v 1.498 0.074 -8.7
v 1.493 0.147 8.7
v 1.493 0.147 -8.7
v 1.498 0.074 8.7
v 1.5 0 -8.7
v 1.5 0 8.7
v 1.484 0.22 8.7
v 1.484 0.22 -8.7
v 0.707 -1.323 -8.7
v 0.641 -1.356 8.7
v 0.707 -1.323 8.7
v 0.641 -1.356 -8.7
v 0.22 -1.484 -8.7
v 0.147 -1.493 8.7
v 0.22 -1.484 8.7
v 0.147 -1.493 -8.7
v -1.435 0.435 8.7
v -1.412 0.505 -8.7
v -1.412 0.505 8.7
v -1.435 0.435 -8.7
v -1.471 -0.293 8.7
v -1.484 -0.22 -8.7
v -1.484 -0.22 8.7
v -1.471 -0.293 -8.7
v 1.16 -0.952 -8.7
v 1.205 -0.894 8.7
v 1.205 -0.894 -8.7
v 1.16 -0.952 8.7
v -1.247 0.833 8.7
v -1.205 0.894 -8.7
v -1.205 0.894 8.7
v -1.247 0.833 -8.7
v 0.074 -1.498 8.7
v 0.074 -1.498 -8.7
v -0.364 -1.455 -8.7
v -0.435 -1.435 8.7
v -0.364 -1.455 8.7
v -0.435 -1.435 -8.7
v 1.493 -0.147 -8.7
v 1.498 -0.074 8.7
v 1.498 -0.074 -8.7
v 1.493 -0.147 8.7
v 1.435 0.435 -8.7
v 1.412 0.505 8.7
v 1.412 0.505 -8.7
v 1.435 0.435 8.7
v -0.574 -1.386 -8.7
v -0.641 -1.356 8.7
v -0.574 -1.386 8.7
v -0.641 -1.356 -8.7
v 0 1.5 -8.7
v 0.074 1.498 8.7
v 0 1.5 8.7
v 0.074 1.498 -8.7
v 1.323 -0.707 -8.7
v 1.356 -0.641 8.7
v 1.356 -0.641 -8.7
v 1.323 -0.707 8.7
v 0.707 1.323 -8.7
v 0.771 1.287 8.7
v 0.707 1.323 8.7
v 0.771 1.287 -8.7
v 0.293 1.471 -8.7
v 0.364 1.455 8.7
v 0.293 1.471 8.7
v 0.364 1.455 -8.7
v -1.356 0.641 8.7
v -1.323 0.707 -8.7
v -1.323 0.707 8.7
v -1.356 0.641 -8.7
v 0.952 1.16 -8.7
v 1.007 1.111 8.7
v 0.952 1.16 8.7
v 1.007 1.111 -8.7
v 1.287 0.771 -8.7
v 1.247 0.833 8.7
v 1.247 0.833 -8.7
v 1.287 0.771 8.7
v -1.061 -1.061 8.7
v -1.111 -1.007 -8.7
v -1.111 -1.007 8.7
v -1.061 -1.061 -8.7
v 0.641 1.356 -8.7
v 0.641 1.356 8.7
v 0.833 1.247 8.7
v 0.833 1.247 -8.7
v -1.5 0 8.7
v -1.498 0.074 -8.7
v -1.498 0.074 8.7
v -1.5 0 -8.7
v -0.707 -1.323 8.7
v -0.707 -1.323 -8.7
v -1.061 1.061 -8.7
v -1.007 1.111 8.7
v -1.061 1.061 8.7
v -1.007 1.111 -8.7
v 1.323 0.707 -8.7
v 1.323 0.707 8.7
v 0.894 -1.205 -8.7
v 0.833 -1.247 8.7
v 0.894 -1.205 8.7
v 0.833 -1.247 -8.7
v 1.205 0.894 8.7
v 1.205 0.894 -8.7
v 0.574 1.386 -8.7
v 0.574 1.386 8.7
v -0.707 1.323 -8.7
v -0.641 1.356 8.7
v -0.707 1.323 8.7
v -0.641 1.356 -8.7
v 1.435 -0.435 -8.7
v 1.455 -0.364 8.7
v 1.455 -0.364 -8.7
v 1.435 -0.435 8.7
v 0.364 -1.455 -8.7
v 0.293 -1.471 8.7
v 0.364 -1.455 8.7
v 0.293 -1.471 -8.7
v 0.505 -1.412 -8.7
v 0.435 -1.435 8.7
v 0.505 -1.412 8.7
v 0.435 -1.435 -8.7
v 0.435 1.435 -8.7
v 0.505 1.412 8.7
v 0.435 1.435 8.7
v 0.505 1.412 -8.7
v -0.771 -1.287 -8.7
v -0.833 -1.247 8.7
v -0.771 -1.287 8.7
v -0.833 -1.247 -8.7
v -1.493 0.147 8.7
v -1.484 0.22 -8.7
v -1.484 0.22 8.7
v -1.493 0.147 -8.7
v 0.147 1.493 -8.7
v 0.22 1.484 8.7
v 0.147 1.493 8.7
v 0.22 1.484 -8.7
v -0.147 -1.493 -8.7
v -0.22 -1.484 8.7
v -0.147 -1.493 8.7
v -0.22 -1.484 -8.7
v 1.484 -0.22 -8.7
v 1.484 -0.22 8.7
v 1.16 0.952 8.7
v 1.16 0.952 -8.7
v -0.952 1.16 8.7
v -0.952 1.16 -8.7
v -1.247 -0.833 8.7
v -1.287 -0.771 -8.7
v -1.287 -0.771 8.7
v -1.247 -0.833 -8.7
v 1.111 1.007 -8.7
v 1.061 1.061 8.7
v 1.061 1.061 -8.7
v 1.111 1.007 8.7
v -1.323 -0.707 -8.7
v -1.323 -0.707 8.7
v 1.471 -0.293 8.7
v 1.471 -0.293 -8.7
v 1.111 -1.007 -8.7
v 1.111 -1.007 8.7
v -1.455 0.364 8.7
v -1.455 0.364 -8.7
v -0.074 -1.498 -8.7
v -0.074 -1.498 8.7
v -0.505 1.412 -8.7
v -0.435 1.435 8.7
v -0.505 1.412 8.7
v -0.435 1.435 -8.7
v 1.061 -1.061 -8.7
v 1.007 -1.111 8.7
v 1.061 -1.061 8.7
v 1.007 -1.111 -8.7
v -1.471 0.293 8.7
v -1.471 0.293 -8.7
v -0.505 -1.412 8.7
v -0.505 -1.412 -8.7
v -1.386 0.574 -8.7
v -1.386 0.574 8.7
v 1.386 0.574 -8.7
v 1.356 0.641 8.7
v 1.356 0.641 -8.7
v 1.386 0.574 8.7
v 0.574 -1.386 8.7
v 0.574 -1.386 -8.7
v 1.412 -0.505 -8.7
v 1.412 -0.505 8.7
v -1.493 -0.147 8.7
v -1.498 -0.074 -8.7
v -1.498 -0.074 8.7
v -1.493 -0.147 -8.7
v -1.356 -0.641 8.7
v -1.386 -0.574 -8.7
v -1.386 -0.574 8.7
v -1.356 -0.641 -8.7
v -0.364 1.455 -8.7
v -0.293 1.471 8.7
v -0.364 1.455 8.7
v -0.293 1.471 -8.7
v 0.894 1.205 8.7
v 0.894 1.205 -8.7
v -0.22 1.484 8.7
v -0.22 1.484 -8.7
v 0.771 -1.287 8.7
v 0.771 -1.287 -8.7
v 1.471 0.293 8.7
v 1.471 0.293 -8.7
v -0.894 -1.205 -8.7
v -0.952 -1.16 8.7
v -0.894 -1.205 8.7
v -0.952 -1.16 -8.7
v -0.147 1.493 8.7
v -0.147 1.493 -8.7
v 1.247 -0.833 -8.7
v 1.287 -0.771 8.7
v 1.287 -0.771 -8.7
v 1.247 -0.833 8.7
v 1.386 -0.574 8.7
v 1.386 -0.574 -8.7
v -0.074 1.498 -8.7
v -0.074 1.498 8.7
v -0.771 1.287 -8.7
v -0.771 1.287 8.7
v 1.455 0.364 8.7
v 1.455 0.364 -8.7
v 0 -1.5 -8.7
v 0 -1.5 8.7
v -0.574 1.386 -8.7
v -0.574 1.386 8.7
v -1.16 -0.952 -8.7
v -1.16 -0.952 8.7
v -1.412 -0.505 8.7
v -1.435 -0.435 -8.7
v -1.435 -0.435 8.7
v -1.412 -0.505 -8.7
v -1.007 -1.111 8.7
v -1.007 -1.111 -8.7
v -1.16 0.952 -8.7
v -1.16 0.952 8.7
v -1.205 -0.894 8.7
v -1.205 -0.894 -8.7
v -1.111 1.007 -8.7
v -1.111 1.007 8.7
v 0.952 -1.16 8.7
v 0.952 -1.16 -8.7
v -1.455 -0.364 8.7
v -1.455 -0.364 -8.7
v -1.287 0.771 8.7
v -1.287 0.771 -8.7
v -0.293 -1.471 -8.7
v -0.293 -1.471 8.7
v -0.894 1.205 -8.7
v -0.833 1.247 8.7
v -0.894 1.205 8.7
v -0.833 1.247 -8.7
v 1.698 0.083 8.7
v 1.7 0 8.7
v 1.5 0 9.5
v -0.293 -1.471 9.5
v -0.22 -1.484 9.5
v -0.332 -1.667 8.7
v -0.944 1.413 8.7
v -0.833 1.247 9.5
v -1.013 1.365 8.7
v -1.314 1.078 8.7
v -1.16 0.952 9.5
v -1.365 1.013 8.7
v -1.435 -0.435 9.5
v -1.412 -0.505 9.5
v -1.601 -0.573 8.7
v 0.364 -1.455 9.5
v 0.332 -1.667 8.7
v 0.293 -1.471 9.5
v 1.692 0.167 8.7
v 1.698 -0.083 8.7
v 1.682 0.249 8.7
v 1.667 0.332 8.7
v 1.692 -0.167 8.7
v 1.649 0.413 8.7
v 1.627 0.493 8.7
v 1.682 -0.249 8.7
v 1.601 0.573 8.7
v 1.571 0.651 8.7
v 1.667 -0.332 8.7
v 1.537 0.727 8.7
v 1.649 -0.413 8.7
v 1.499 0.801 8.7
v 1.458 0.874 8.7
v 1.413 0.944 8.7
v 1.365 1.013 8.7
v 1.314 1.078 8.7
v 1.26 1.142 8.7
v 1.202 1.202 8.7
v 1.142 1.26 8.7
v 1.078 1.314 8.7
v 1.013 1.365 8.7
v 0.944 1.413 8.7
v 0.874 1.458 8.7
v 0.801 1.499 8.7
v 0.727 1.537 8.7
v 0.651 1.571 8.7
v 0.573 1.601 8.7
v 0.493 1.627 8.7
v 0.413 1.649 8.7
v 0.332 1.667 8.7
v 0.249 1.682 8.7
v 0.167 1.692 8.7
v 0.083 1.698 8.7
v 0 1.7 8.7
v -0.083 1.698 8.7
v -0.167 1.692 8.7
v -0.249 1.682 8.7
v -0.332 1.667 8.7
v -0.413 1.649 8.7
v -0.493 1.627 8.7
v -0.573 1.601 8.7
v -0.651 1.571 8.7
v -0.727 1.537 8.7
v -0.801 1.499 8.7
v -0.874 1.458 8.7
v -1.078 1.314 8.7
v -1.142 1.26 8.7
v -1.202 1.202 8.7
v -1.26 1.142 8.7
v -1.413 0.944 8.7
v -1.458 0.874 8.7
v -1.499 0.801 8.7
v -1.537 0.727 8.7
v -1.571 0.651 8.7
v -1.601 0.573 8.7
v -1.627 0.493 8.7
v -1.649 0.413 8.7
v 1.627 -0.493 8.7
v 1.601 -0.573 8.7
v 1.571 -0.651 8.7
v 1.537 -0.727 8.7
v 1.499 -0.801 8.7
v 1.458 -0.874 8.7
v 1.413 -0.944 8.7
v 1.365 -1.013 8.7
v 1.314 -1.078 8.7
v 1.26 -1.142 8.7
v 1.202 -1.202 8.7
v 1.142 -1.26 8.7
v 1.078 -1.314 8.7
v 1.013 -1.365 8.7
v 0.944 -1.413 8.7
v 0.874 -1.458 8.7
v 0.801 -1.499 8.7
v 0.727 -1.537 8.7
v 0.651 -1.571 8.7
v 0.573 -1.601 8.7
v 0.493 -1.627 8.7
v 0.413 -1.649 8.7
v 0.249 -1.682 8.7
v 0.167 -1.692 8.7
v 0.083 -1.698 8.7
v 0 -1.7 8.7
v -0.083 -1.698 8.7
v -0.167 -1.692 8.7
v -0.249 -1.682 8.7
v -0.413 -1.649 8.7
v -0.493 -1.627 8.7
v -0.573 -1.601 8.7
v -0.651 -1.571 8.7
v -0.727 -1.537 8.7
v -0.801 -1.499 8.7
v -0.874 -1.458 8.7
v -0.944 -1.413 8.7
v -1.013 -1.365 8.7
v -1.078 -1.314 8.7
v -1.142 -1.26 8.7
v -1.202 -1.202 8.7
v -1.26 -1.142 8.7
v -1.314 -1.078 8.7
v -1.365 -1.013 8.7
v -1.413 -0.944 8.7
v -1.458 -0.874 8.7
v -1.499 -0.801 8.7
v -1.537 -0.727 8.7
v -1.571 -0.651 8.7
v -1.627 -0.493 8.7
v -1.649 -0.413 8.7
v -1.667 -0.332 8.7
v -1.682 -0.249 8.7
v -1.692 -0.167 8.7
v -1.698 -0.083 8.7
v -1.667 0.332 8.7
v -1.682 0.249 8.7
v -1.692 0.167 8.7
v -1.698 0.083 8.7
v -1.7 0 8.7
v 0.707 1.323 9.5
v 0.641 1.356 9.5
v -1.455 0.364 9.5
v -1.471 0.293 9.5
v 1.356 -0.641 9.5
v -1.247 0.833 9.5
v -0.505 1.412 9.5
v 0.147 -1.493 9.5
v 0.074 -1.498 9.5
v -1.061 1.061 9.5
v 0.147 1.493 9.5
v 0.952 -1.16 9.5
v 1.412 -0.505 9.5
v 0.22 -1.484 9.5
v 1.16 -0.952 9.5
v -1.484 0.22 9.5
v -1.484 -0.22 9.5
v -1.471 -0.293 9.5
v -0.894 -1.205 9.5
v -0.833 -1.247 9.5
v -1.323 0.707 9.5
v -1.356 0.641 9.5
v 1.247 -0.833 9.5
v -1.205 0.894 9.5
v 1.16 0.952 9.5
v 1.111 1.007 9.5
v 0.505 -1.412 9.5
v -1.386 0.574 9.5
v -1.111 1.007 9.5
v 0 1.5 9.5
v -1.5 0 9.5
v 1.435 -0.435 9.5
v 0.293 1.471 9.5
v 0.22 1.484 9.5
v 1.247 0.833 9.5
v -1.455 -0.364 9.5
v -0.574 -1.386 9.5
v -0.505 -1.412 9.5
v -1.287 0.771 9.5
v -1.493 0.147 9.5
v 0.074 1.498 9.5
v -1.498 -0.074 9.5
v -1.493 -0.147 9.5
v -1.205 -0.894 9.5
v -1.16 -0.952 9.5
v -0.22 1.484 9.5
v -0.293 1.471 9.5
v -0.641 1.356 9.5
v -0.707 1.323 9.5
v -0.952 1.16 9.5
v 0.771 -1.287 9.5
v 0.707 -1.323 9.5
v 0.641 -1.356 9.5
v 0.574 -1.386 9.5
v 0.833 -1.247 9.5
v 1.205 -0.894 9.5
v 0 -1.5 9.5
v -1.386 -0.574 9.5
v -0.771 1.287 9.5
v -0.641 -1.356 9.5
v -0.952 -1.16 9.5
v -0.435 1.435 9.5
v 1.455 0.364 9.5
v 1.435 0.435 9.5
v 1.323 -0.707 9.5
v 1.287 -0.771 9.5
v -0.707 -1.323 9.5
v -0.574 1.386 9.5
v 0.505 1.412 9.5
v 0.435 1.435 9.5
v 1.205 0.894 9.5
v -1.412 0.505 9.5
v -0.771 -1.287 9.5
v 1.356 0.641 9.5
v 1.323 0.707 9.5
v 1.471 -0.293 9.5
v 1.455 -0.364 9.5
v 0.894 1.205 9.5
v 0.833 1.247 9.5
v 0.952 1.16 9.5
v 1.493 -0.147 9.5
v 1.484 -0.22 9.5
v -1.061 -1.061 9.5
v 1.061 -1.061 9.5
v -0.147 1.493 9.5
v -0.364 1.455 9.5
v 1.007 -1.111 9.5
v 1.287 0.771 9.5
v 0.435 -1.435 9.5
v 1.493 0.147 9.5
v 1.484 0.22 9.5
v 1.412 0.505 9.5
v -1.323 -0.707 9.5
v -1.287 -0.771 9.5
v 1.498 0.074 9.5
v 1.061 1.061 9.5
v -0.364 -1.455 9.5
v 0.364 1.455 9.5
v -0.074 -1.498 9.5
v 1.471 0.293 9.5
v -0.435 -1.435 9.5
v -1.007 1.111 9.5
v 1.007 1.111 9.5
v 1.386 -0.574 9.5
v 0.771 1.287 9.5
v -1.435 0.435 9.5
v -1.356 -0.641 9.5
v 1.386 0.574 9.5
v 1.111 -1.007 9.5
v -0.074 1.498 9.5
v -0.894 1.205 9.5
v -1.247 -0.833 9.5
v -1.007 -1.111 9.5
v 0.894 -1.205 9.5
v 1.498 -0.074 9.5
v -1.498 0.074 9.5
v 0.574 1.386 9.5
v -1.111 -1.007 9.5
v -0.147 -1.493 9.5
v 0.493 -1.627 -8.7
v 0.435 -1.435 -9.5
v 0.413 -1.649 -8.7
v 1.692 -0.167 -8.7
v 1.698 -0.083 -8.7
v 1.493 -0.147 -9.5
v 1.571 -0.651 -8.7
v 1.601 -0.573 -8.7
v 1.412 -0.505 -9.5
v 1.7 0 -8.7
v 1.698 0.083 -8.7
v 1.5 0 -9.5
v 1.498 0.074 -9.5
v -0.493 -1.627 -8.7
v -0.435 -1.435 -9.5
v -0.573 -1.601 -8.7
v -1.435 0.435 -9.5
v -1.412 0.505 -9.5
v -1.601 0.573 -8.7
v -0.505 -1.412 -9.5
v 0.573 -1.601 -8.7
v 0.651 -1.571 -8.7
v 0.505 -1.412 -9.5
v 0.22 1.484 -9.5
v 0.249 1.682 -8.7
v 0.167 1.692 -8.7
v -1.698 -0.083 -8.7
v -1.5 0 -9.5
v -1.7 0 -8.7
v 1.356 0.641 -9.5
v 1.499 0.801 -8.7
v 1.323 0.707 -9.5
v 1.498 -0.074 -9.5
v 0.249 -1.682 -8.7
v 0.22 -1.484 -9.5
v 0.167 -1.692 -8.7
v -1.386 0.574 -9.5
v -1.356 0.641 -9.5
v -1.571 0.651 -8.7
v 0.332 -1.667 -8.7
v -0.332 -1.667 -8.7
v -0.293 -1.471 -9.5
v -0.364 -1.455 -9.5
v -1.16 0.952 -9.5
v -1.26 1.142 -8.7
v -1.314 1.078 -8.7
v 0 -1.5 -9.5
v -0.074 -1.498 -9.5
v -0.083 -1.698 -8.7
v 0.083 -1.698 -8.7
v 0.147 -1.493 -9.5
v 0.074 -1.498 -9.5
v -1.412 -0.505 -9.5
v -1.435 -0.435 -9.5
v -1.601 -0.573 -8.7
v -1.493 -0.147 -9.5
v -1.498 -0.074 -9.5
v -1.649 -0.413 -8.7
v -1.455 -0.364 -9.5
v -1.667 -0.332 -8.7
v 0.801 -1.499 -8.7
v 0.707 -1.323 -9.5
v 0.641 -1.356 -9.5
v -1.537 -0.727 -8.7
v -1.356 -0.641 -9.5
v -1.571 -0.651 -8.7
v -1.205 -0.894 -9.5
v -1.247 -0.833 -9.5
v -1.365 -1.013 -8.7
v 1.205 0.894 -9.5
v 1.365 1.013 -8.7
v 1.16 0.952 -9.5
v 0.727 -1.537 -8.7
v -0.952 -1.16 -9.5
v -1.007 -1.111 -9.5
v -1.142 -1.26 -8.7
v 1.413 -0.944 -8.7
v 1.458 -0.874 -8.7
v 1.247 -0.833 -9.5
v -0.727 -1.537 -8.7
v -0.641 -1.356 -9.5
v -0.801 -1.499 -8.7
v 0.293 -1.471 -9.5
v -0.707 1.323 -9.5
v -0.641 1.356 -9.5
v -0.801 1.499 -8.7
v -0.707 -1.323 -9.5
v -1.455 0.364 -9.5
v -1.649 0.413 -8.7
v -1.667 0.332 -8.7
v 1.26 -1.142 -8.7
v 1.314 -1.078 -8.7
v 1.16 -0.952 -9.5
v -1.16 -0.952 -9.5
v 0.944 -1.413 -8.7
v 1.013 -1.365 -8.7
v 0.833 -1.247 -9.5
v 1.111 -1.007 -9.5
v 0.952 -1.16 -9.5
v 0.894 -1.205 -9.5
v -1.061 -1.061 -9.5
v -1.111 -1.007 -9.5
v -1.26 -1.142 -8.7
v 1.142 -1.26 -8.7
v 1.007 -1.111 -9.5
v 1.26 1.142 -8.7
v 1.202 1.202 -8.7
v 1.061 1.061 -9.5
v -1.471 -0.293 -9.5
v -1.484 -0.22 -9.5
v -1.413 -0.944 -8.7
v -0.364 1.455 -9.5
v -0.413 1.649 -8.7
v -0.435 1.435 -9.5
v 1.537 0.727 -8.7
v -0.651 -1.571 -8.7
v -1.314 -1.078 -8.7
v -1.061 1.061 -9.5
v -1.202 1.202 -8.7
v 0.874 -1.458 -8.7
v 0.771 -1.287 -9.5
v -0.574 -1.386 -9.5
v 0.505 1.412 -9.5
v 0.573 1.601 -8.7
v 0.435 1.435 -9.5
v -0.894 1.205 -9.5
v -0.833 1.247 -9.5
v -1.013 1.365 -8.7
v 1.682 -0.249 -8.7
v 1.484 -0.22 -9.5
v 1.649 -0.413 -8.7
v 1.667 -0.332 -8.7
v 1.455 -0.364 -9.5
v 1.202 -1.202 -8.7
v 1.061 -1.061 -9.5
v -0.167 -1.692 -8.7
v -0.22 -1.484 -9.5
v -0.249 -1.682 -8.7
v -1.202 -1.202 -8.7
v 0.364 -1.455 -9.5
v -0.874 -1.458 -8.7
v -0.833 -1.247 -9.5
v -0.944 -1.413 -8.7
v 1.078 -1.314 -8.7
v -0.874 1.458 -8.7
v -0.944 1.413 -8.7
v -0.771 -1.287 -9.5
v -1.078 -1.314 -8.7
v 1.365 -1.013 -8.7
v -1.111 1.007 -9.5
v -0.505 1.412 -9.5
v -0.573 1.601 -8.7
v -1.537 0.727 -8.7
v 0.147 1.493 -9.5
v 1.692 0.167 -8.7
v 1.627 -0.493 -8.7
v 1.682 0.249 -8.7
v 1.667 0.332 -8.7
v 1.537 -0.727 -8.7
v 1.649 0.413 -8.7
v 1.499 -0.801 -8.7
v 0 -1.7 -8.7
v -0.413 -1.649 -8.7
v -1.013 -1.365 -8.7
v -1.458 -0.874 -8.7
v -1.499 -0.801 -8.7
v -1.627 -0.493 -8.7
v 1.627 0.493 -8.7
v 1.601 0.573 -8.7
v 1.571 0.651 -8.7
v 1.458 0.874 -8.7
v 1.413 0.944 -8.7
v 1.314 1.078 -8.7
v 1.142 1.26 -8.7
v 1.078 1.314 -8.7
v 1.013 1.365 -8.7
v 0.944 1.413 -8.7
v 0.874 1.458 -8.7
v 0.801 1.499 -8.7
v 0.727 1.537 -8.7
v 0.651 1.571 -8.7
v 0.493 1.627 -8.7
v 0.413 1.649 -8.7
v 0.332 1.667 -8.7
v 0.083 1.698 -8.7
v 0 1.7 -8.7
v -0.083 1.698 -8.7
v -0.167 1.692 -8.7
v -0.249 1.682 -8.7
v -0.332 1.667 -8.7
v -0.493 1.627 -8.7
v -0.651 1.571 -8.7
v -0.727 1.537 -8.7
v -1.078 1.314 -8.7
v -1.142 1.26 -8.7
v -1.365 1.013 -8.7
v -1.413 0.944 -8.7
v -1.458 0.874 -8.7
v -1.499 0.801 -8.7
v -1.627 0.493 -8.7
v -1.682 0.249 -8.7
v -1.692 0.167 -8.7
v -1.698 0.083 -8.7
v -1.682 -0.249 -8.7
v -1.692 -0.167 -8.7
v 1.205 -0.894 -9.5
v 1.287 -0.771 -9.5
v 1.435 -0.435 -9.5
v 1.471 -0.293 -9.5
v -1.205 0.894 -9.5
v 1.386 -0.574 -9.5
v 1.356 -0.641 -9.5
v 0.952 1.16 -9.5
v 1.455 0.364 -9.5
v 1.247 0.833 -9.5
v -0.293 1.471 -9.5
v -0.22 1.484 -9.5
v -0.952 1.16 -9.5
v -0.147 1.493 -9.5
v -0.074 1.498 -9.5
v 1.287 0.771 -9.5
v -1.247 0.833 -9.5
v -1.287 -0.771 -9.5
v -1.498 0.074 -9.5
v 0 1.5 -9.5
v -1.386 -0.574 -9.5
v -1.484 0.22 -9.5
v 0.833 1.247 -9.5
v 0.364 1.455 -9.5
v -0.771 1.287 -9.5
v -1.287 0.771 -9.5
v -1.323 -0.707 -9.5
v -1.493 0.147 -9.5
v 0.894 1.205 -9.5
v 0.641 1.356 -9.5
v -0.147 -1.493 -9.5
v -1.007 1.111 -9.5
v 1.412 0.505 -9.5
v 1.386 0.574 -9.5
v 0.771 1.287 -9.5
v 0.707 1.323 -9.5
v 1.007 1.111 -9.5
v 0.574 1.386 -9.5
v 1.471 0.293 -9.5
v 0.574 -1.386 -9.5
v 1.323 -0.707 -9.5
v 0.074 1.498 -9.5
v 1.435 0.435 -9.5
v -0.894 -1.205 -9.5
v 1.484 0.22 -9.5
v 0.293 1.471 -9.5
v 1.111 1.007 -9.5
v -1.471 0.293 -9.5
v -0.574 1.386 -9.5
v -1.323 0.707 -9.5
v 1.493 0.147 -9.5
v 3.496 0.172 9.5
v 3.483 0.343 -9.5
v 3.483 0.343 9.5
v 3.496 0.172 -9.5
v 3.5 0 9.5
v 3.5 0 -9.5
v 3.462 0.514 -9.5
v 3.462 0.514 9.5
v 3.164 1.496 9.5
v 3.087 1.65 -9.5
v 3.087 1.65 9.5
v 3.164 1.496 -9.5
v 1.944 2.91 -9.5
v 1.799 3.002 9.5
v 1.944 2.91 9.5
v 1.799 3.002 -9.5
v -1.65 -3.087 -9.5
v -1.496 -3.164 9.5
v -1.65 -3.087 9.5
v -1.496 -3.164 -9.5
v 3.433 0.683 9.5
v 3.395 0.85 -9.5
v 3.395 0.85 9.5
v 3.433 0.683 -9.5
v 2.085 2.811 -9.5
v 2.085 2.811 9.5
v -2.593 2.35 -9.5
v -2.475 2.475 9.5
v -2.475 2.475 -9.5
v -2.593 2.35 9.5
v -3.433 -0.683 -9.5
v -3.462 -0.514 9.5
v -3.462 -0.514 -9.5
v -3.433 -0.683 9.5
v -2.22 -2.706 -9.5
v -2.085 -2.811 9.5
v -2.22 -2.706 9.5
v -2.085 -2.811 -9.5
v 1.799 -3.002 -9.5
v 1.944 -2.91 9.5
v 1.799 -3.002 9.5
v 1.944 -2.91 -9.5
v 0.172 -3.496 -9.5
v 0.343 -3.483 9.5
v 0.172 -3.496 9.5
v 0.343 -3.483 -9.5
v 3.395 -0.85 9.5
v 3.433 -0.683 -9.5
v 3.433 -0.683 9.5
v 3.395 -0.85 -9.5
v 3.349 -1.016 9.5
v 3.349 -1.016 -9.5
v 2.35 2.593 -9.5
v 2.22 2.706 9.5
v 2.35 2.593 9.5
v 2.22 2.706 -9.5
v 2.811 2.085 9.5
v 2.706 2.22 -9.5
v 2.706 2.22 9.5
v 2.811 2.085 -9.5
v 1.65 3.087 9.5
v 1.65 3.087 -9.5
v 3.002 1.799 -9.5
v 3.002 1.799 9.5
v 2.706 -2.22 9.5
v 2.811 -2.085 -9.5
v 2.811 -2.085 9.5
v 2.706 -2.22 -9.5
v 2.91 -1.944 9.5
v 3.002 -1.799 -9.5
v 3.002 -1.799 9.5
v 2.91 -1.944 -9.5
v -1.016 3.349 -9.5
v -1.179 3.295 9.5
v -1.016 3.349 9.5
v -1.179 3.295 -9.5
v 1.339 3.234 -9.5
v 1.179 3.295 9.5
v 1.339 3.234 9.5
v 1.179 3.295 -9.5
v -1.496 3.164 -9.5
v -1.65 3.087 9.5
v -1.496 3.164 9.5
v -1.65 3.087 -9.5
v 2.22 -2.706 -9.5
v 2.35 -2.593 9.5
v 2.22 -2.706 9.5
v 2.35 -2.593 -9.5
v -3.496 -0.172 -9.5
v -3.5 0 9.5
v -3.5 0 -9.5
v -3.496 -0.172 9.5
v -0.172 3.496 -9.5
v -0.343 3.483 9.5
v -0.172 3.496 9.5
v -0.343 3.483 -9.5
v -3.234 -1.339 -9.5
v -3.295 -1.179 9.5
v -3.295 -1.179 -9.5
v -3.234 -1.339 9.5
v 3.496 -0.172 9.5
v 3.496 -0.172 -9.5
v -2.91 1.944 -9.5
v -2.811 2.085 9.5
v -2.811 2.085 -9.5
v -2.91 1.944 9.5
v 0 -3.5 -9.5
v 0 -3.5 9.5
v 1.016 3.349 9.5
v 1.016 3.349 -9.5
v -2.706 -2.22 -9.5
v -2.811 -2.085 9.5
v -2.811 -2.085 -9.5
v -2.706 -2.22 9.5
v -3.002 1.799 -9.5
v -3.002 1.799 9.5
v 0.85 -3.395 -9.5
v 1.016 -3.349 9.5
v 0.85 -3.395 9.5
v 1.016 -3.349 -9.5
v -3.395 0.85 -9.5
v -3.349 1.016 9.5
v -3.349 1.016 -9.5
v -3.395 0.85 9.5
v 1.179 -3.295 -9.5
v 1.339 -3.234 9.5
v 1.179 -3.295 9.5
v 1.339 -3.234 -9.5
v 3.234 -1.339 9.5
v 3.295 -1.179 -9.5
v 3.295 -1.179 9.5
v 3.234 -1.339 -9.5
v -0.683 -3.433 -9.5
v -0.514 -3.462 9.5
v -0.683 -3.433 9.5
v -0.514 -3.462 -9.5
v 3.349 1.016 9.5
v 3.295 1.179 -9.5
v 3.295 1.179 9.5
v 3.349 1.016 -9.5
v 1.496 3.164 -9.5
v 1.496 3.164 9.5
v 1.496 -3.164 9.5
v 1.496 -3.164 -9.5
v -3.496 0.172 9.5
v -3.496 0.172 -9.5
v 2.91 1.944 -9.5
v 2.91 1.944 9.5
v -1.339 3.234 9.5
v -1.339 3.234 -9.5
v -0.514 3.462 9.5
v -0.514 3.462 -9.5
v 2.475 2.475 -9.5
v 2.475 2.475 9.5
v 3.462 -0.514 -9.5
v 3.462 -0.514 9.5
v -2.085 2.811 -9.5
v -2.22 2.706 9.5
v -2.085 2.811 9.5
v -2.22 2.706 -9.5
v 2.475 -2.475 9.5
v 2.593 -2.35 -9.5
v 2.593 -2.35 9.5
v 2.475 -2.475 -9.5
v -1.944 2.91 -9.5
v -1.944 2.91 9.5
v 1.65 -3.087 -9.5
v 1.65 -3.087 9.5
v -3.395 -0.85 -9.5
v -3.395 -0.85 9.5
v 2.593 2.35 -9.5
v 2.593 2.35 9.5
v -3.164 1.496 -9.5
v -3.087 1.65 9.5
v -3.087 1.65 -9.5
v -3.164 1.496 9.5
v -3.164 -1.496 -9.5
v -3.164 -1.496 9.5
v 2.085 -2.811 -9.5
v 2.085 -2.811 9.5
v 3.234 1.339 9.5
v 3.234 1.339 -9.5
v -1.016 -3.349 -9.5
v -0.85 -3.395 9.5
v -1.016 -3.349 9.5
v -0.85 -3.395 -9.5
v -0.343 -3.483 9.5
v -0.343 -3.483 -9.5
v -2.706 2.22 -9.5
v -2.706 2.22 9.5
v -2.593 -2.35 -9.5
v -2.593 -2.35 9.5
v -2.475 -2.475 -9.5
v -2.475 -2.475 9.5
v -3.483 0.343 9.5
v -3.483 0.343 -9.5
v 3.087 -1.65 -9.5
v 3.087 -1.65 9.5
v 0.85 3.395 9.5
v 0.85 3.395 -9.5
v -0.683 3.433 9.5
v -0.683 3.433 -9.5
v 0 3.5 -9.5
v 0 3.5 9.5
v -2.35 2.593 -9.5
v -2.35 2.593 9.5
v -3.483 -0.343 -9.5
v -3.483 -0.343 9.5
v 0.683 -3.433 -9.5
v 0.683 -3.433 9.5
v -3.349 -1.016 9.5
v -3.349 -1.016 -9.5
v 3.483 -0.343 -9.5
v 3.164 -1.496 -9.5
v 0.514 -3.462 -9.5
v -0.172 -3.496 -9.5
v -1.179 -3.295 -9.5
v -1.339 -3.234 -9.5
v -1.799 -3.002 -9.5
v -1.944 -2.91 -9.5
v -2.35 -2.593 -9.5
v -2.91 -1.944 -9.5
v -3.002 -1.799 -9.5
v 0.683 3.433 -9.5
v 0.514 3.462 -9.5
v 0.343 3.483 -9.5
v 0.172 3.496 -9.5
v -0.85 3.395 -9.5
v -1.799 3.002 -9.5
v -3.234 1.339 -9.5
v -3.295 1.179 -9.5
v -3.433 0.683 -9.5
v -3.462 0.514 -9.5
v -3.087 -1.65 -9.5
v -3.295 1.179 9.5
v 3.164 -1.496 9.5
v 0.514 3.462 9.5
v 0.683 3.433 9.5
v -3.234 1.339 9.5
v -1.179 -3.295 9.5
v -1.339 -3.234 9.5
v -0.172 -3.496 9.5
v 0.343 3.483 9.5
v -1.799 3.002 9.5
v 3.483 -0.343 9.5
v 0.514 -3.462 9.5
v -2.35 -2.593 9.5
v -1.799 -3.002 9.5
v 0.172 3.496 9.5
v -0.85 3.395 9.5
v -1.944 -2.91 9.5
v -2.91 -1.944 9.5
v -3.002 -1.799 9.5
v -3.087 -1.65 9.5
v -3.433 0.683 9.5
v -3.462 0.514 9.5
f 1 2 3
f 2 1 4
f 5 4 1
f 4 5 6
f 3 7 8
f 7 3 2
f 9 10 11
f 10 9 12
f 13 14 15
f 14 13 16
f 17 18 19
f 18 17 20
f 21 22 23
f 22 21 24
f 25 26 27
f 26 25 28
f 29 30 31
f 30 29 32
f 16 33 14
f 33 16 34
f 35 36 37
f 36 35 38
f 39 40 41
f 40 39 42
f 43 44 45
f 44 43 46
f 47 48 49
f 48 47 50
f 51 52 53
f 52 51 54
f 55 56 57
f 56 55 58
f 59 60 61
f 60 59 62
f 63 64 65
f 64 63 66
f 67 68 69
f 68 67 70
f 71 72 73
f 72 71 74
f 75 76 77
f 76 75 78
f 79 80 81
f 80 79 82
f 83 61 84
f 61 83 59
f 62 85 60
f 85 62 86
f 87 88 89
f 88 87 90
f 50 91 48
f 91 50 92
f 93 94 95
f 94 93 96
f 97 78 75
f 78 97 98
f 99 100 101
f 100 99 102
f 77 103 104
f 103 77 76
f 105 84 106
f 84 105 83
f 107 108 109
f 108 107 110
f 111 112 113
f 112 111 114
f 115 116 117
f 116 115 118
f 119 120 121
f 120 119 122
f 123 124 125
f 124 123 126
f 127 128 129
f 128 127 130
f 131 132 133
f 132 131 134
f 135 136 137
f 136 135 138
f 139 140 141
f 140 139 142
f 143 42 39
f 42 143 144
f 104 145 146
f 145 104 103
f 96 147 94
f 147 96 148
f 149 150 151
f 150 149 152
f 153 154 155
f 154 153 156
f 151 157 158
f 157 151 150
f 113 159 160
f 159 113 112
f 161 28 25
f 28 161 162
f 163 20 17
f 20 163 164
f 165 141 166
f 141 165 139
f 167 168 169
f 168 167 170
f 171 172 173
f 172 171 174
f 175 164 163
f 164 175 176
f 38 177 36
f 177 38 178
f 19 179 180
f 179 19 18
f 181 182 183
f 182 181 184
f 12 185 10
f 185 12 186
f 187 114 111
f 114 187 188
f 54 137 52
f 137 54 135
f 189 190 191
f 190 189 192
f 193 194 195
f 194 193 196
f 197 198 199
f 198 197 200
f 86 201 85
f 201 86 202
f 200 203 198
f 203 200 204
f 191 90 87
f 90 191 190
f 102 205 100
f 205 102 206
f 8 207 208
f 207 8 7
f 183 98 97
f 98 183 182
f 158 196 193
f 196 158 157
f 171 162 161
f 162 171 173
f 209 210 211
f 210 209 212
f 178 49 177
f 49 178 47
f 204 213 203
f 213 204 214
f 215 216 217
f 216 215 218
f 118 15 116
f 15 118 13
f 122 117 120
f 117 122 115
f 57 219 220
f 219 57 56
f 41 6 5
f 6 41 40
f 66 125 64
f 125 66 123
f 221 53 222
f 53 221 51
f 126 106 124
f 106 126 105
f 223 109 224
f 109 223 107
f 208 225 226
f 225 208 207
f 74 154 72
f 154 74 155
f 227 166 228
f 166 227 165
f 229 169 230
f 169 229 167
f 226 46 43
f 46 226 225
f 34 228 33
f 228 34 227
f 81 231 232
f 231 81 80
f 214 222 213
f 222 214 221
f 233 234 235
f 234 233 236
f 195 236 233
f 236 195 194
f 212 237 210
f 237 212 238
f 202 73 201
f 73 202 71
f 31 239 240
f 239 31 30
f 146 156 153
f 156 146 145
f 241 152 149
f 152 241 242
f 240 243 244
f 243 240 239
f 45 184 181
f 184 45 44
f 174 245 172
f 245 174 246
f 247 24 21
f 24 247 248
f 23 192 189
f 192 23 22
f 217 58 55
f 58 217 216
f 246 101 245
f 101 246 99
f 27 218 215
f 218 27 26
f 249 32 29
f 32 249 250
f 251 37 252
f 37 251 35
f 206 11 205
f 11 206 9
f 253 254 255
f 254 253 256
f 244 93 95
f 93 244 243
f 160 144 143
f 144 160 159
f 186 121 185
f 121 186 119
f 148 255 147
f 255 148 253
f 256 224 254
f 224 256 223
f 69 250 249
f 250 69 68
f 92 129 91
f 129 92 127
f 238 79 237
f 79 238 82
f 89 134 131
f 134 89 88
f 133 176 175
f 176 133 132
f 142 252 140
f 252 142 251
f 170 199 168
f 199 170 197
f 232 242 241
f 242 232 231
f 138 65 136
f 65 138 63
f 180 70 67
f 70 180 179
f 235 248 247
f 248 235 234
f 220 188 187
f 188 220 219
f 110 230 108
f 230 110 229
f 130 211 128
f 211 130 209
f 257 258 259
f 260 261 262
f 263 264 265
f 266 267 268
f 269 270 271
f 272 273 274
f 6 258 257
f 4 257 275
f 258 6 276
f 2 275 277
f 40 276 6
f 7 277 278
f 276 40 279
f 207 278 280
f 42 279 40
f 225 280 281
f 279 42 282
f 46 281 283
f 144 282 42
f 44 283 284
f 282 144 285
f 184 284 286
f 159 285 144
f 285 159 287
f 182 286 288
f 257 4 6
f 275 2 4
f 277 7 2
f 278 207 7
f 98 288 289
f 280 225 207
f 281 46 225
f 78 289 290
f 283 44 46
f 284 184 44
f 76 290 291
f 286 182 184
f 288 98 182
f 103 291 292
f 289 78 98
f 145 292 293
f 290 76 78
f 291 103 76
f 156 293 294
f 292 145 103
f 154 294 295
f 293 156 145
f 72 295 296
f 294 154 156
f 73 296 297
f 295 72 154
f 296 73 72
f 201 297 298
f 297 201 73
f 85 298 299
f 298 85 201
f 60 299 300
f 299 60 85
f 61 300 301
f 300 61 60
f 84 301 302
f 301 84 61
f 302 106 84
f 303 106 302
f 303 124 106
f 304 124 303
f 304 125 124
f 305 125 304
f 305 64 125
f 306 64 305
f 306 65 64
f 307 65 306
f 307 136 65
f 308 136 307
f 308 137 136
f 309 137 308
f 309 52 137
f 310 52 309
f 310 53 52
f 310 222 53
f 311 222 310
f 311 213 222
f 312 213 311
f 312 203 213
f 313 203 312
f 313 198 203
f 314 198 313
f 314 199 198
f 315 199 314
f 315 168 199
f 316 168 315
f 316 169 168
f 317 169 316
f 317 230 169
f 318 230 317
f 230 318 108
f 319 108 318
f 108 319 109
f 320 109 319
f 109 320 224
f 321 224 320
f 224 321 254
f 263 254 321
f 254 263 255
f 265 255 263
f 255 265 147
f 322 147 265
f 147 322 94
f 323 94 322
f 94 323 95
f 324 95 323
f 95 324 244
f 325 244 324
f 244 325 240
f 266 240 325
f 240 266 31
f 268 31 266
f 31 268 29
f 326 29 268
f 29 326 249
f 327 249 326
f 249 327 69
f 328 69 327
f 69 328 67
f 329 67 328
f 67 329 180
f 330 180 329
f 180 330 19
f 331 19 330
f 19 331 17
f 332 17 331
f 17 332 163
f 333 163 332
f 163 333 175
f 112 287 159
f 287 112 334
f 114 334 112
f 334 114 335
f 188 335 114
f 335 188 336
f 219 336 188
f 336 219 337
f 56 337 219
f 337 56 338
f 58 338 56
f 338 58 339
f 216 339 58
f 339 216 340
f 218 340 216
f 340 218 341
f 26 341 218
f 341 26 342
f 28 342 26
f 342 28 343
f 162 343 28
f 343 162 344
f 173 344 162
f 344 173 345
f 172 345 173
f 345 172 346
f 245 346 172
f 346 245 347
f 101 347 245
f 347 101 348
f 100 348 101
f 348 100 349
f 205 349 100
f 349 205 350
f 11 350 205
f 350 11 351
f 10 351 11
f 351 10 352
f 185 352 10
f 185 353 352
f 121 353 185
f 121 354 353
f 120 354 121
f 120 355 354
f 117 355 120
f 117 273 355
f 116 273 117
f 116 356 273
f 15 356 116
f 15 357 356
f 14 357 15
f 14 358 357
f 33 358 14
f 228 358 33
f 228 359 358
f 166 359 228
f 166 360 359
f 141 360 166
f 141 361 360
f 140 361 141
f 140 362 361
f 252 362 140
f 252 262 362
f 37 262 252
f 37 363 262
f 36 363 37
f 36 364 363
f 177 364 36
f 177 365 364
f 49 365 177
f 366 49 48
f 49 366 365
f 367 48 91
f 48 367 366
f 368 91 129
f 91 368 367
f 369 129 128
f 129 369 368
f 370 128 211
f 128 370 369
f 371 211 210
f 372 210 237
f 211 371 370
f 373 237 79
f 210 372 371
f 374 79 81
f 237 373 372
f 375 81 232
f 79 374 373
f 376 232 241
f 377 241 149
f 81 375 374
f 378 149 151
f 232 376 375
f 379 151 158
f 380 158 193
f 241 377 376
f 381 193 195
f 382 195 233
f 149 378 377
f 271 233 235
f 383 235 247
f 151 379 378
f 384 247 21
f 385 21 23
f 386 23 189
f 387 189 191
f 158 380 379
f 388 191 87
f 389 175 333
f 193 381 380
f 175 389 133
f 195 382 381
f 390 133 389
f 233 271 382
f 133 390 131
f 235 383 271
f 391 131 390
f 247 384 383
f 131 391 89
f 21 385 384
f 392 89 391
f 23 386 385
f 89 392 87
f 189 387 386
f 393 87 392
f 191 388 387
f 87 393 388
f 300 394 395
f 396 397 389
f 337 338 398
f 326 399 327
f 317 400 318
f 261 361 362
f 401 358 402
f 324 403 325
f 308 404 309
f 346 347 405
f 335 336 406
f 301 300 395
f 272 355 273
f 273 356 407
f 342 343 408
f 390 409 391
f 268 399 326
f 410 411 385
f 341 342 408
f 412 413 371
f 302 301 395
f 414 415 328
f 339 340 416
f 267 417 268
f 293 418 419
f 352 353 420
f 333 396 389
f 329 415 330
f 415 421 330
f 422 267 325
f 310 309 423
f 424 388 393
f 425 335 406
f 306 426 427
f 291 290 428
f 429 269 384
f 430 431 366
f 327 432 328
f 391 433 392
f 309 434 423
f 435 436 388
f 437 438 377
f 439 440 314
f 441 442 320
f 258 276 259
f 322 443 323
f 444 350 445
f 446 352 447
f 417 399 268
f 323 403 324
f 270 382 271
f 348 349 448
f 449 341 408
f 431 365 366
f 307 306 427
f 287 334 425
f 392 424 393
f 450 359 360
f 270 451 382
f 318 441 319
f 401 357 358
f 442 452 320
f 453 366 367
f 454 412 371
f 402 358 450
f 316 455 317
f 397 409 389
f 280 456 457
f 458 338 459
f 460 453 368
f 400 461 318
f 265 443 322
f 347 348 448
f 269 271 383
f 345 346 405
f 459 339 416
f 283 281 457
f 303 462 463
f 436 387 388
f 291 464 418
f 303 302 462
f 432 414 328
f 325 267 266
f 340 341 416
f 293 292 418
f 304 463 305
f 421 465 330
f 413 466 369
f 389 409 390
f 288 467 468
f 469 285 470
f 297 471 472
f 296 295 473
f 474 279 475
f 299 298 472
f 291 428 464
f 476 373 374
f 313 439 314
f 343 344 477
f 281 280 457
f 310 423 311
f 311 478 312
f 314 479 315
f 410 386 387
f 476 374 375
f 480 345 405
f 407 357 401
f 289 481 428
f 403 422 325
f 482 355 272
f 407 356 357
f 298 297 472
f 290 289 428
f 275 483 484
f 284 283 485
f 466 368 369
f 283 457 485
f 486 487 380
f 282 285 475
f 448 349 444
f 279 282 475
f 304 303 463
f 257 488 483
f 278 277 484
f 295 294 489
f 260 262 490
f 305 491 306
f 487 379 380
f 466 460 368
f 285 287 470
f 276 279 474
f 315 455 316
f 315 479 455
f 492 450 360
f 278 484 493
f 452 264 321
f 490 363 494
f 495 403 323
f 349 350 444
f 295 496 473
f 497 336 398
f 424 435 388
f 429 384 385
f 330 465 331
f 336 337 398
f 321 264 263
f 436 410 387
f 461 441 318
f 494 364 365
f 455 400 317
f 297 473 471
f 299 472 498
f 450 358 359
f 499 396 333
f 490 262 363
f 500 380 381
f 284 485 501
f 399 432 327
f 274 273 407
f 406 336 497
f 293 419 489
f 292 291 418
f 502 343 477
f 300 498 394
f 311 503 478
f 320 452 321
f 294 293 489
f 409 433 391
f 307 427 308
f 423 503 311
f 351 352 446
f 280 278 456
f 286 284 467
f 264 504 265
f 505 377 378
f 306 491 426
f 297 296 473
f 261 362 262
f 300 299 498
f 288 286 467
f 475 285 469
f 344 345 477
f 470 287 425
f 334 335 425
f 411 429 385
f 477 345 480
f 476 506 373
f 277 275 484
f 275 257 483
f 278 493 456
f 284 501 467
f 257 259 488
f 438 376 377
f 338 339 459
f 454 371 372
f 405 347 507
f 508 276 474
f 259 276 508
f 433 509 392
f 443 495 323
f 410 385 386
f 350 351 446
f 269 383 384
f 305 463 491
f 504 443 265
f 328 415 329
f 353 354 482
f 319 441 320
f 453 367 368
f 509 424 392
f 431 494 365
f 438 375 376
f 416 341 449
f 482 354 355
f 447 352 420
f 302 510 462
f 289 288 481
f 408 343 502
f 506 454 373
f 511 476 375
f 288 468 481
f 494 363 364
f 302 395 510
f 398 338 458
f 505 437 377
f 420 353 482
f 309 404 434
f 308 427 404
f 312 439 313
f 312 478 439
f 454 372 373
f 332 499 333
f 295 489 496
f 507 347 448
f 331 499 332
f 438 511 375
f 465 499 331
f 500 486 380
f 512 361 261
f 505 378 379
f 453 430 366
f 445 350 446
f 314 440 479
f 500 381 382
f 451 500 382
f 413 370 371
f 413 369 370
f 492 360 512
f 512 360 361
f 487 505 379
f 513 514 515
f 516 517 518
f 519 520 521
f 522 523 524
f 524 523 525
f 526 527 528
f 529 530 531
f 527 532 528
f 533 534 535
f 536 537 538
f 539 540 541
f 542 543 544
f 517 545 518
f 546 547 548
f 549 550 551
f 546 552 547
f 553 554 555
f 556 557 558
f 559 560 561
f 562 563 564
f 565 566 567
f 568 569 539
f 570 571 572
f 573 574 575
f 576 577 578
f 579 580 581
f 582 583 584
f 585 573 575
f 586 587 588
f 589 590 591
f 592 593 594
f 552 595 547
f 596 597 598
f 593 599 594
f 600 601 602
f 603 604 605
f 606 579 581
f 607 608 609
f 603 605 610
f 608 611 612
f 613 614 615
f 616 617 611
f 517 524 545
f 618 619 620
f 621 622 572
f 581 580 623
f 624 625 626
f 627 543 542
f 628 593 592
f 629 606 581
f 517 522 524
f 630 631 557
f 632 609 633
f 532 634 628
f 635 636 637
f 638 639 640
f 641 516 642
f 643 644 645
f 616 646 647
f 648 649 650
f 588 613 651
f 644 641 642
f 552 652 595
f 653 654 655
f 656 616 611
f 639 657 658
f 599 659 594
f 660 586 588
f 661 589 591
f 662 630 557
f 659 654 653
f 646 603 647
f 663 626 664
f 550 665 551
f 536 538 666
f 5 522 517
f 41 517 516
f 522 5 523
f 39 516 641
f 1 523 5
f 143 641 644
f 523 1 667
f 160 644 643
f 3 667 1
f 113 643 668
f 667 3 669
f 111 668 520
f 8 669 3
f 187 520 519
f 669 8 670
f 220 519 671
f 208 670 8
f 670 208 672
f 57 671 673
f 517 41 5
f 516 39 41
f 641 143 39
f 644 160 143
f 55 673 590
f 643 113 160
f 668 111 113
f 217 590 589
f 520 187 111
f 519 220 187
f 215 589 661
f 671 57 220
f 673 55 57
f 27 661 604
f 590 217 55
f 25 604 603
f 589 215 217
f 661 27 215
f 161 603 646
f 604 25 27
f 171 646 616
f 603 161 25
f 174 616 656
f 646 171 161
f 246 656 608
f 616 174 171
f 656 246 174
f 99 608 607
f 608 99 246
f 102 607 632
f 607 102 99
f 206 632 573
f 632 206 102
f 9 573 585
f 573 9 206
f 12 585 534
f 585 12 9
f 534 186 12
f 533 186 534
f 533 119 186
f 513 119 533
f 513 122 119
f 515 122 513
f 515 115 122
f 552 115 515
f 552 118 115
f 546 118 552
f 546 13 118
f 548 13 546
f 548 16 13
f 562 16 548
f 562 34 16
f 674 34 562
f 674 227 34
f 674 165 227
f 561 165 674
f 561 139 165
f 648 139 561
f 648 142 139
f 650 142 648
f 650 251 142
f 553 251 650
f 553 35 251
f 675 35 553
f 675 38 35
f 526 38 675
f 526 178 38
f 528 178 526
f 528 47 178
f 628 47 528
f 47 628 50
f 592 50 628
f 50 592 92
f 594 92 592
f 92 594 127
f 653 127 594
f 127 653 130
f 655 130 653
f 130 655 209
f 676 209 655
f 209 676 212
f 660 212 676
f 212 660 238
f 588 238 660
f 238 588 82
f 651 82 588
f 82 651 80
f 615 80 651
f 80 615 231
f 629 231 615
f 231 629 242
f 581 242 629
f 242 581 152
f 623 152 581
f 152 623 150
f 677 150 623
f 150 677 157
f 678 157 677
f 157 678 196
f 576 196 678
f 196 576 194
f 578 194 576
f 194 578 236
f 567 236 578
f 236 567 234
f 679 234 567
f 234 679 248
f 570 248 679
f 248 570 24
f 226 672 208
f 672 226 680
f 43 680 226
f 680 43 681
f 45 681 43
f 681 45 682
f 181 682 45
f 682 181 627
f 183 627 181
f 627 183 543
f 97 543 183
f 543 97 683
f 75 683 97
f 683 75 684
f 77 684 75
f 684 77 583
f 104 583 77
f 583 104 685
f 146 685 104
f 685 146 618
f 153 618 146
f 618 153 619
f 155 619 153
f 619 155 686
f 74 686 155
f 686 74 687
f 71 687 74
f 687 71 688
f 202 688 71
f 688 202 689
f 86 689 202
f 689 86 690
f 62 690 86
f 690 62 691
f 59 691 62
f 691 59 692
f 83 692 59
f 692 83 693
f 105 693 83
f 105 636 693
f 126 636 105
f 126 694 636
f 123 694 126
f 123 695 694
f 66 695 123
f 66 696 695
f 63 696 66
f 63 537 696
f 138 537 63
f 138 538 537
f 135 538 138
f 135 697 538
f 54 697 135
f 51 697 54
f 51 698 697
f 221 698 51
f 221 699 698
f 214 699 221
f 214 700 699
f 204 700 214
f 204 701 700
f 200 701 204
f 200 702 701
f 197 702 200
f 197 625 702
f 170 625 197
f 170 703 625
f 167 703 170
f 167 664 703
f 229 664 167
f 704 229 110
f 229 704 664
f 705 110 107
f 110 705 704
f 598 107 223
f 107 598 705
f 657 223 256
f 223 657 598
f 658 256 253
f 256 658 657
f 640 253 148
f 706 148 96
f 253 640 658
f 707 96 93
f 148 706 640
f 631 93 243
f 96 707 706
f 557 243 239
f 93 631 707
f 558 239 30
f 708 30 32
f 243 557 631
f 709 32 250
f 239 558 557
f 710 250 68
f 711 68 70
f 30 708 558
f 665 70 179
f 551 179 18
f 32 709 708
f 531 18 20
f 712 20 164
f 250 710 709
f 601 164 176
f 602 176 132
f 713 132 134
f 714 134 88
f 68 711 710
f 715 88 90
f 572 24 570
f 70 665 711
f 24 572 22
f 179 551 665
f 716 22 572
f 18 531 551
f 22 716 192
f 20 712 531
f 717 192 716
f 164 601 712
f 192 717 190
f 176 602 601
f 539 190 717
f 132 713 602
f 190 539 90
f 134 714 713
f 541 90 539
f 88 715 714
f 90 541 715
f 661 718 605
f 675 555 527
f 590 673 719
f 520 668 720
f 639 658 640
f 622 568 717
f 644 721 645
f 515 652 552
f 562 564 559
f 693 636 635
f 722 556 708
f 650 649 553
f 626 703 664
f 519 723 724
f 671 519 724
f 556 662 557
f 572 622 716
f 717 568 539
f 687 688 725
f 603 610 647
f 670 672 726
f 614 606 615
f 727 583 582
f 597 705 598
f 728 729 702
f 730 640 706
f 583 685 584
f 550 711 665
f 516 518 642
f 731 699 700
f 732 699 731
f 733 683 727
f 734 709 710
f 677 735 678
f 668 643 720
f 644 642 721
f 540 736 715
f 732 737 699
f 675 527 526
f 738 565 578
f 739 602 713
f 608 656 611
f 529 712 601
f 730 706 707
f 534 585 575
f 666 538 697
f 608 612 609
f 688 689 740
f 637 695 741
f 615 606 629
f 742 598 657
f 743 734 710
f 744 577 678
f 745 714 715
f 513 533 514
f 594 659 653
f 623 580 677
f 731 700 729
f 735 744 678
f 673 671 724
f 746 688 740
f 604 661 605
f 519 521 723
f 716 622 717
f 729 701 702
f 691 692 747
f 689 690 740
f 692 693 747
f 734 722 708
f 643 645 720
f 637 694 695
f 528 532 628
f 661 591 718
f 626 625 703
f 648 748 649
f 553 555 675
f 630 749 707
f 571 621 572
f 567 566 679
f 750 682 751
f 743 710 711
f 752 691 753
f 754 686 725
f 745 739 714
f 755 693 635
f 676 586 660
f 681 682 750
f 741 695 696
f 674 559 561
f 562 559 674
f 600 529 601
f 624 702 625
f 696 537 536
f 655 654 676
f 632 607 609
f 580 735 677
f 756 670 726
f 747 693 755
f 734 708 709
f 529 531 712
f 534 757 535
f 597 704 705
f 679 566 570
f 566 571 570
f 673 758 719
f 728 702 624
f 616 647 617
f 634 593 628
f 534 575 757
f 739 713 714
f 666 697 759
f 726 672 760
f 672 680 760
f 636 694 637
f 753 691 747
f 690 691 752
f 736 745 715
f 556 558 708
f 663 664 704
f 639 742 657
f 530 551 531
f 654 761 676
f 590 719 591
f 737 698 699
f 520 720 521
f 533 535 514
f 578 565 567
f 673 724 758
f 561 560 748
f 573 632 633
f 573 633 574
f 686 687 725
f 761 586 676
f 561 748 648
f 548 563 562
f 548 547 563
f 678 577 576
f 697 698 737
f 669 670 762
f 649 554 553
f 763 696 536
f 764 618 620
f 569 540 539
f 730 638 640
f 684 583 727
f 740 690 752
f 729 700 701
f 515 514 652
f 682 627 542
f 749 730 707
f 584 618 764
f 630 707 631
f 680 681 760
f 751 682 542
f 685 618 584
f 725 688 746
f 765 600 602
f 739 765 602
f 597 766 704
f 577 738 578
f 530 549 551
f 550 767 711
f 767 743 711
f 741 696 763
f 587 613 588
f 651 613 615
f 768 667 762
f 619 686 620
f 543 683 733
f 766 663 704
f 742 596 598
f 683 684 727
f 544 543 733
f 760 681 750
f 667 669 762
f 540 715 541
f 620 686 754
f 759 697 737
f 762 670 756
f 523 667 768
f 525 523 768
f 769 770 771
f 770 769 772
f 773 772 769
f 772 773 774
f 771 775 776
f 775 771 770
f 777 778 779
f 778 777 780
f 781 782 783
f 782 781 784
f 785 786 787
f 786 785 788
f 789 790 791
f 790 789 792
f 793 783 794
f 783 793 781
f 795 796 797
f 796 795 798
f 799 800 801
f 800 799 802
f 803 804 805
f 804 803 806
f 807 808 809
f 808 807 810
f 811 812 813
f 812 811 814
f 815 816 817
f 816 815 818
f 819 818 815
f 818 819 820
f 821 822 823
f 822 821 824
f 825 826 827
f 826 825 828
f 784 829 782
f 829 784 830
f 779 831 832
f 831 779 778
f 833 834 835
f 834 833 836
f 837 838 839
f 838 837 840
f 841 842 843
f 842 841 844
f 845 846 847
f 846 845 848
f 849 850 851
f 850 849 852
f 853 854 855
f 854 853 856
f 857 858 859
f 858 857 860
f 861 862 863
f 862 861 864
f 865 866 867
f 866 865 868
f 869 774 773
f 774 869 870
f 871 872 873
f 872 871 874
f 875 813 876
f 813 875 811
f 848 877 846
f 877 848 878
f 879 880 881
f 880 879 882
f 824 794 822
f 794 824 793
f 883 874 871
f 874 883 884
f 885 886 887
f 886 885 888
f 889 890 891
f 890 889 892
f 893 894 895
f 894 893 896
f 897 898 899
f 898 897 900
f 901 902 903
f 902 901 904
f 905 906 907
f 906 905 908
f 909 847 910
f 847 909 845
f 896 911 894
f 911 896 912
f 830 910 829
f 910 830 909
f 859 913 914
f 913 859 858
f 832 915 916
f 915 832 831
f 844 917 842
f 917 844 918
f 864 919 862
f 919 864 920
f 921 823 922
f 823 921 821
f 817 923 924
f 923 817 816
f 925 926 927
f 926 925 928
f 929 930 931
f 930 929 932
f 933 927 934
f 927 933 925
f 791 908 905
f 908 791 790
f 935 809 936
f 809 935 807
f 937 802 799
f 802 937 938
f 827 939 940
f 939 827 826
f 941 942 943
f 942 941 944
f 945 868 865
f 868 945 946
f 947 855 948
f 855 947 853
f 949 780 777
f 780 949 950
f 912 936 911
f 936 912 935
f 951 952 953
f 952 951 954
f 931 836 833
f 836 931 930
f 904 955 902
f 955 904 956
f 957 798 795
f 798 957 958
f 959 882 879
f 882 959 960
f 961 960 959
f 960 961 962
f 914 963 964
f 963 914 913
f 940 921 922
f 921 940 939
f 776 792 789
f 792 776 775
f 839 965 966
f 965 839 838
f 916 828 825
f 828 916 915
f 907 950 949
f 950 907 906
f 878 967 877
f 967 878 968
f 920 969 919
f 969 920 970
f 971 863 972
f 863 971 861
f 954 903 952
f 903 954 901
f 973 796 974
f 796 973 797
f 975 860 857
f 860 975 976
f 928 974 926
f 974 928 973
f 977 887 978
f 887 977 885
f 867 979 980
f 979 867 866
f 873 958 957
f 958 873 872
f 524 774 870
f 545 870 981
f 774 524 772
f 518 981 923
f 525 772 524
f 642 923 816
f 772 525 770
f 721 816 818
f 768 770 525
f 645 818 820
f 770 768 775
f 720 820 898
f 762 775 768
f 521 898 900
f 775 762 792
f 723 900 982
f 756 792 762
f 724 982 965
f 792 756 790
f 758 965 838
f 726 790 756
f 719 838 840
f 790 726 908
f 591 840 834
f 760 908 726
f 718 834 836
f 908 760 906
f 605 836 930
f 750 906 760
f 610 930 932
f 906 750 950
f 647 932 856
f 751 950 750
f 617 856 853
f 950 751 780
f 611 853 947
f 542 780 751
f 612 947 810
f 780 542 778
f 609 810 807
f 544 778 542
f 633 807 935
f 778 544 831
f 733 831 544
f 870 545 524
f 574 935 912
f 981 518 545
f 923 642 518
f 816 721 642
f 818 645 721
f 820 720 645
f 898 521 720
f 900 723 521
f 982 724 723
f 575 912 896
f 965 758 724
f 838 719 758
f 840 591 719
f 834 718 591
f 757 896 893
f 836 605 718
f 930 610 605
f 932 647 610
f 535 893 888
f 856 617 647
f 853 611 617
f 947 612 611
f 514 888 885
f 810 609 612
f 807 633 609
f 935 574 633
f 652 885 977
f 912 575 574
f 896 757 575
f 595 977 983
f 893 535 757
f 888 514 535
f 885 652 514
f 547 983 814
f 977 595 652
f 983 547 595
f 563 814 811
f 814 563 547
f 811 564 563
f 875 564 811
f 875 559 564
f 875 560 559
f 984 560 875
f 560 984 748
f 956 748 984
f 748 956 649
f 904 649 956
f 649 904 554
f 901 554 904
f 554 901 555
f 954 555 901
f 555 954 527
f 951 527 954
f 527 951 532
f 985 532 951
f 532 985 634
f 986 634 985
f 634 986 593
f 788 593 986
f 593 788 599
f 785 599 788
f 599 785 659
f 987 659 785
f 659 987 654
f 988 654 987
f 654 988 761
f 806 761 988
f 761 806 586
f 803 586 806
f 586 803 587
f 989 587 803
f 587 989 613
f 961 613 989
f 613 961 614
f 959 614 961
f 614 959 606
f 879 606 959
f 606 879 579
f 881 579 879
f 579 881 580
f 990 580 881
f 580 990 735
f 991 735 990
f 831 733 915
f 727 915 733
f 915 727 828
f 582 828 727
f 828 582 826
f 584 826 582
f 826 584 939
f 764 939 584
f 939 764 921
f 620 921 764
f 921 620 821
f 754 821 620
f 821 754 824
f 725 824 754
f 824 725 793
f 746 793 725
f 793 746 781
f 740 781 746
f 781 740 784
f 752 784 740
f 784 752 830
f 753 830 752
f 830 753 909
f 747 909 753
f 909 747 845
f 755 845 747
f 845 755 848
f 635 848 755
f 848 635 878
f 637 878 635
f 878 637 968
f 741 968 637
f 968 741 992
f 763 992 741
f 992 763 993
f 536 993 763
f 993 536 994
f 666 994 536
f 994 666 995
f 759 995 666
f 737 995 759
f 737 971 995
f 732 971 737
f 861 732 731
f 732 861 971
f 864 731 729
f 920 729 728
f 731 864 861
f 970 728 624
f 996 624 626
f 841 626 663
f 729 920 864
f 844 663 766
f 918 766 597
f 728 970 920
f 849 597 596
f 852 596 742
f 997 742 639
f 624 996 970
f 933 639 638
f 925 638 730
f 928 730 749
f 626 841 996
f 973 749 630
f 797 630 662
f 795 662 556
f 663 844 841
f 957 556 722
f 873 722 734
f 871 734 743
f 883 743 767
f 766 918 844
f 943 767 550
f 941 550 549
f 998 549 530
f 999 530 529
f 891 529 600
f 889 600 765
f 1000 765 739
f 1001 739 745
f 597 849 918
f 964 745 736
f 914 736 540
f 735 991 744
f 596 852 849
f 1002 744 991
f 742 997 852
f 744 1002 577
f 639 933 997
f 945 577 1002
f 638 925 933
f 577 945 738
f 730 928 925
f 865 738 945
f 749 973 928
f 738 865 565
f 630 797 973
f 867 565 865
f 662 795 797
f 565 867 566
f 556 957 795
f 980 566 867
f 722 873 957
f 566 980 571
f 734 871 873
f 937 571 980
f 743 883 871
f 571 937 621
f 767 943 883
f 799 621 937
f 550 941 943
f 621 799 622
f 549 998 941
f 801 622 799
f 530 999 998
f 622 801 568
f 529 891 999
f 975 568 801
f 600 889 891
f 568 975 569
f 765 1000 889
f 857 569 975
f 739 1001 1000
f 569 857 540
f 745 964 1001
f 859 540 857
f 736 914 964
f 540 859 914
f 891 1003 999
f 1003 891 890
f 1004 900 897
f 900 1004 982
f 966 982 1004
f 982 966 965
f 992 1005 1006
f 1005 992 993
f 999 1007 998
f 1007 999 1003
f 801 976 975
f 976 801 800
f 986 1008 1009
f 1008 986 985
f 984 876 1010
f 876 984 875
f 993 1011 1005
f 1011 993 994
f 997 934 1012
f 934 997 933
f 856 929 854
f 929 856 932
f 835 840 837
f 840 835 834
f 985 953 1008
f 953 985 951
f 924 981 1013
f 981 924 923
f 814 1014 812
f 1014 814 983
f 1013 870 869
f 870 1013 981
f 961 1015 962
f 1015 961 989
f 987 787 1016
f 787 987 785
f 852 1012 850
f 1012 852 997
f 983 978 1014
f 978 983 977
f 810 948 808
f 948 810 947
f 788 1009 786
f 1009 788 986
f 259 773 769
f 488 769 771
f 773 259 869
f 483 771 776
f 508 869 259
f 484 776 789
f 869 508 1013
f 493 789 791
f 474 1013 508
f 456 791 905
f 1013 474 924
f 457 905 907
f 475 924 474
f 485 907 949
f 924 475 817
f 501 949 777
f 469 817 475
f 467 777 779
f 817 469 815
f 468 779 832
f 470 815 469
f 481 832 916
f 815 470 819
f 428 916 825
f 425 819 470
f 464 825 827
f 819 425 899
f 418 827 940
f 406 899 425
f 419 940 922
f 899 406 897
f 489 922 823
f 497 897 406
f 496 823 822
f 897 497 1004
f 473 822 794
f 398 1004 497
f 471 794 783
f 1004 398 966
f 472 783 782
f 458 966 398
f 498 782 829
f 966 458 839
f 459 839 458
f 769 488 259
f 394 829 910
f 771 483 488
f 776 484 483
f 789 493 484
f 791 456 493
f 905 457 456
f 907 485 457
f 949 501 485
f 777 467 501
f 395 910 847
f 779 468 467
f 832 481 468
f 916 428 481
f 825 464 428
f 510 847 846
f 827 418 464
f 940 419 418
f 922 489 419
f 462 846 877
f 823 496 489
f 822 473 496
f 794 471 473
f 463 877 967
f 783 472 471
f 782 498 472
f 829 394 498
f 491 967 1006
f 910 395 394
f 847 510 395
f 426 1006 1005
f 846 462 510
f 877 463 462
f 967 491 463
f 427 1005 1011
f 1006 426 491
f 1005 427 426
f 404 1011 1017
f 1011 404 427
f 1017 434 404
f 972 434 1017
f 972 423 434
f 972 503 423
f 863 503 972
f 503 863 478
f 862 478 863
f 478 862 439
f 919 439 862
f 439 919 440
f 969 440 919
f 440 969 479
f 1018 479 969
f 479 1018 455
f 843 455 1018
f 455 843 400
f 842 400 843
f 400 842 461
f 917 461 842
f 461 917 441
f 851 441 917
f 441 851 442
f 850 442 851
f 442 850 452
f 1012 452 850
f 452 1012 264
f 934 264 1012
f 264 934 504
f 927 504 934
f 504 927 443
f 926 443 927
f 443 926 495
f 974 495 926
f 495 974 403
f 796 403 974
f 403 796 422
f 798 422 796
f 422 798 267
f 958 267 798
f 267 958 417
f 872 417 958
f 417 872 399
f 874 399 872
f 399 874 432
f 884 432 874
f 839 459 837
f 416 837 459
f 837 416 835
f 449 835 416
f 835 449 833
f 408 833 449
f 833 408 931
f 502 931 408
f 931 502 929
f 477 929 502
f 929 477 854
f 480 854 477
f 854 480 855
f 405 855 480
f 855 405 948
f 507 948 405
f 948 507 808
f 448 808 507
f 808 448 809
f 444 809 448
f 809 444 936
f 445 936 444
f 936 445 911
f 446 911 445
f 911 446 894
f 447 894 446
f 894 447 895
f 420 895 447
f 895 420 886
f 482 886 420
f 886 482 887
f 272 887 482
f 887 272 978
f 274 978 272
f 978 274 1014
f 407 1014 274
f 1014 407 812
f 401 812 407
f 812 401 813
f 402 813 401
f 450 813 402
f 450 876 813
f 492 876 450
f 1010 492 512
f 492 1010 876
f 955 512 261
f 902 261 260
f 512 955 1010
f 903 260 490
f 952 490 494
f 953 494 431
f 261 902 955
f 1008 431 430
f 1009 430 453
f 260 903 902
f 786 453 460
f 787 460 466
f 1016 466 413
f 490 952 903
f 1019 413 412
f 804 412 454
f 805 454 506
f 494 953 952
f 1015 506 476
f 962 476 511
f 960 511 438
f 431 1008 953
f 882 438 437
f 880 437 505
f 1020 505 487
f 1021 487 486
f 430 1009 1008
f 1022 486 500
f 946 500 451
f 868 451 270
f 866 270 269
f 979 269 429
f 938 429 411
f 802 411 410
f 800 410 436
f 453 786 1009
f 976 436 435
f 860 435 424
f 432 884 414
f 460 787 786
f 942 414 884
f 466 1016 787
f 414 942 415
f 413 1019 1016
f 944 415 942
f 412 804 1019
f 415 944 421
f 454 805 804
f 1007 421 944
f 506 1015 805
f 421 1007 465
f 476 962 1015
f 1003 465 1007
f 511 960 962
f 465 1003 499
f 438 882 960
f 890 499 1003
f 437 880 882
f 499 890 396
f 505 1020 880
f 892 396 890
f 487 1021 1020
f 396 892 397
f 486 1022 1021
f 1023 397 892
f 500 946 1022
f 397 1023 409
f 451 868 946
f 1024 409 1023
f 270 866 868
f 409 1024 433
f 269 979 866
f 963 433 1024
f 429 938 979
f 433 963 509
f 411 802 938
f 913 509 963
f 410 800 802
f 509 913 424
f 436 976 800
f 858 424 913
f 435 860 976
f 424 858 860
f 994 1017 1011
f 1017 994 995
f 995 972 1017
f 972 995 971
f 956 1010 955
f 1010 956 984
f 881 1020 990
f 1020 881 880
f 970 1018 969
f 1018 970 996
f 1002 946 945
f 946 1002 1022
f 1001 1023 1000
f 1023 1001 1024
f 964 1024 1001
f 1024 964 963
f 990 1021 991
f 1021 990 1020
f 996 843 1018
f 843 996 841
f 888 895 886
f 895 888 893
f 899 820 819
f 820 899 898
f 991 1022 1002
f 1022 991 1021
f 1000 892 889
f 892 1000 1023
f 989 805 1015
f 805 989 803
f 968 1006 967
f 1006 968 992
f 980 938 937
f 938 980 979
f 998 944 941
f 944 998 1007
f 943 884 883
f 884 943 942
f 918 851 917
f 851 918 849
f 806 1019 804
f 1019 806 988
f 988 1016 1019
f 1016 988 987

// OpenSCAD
// Long linear bearing: 3.0mm bore, 7.0mm OD, 19.0mm length
// Single connected solid (bearing only)

// Parameters
bore_diameter_mm  = 3.0;  //[1.5:6.0:0.1]
outer_diameter_mm = 7.0;  //[3.5:14.0:0.1]
length_mm         = 19.0; //[9.5:38.0:0.1]
chamfer_mm        = 0.2;  //[0.0:1.0:0.05]
overlap_mm        = 0.6;  //[0.2:2.0:0.1]

$fn = 128;

module linear_bearing(bore_d=bore_diameter_mm, od=outer_diameter_mm, L=length_mm, chamfer=chamfer_mm, overlap=overlap_mm) {

  // Ensure valid geometry
  bore_r = bore_d/2;
  od_r   = od/2;
  ch     = max(0, chamfer);
  ov     = max(0.01, overlap);

  difference() {
    // Outer body (OD = 7mm, length = 19mm)
    cylinder(h=L, r=od_r, center=true);

    // Inner bore (ID = 3mm) + lead-in chamfers
    union() {
      // Through bore (extend beyond ends to guarantee a clean cut)
      cylinder(h=L + 2*ov, r=bore_r, center=true);

      // Lead-in at +Z end (connected via overlap)
      if (ch > 0)
        translate([0, 0,  L/2 - (ch + ov)/2])
          cylinder(h=ch + ov, r1=bore_r + ch, r2=bore_r, center=true);

      // Lead-in at -Z end (connected via overlap)
      if (ch > 0)
        translate([0, 0, -L/2 + (ch + ov)/2])
          cylinder(h=ch + ov, r1=bore_r, r2=bore_r + ch, center=true);
    }
  }
}

linear_bearing();
